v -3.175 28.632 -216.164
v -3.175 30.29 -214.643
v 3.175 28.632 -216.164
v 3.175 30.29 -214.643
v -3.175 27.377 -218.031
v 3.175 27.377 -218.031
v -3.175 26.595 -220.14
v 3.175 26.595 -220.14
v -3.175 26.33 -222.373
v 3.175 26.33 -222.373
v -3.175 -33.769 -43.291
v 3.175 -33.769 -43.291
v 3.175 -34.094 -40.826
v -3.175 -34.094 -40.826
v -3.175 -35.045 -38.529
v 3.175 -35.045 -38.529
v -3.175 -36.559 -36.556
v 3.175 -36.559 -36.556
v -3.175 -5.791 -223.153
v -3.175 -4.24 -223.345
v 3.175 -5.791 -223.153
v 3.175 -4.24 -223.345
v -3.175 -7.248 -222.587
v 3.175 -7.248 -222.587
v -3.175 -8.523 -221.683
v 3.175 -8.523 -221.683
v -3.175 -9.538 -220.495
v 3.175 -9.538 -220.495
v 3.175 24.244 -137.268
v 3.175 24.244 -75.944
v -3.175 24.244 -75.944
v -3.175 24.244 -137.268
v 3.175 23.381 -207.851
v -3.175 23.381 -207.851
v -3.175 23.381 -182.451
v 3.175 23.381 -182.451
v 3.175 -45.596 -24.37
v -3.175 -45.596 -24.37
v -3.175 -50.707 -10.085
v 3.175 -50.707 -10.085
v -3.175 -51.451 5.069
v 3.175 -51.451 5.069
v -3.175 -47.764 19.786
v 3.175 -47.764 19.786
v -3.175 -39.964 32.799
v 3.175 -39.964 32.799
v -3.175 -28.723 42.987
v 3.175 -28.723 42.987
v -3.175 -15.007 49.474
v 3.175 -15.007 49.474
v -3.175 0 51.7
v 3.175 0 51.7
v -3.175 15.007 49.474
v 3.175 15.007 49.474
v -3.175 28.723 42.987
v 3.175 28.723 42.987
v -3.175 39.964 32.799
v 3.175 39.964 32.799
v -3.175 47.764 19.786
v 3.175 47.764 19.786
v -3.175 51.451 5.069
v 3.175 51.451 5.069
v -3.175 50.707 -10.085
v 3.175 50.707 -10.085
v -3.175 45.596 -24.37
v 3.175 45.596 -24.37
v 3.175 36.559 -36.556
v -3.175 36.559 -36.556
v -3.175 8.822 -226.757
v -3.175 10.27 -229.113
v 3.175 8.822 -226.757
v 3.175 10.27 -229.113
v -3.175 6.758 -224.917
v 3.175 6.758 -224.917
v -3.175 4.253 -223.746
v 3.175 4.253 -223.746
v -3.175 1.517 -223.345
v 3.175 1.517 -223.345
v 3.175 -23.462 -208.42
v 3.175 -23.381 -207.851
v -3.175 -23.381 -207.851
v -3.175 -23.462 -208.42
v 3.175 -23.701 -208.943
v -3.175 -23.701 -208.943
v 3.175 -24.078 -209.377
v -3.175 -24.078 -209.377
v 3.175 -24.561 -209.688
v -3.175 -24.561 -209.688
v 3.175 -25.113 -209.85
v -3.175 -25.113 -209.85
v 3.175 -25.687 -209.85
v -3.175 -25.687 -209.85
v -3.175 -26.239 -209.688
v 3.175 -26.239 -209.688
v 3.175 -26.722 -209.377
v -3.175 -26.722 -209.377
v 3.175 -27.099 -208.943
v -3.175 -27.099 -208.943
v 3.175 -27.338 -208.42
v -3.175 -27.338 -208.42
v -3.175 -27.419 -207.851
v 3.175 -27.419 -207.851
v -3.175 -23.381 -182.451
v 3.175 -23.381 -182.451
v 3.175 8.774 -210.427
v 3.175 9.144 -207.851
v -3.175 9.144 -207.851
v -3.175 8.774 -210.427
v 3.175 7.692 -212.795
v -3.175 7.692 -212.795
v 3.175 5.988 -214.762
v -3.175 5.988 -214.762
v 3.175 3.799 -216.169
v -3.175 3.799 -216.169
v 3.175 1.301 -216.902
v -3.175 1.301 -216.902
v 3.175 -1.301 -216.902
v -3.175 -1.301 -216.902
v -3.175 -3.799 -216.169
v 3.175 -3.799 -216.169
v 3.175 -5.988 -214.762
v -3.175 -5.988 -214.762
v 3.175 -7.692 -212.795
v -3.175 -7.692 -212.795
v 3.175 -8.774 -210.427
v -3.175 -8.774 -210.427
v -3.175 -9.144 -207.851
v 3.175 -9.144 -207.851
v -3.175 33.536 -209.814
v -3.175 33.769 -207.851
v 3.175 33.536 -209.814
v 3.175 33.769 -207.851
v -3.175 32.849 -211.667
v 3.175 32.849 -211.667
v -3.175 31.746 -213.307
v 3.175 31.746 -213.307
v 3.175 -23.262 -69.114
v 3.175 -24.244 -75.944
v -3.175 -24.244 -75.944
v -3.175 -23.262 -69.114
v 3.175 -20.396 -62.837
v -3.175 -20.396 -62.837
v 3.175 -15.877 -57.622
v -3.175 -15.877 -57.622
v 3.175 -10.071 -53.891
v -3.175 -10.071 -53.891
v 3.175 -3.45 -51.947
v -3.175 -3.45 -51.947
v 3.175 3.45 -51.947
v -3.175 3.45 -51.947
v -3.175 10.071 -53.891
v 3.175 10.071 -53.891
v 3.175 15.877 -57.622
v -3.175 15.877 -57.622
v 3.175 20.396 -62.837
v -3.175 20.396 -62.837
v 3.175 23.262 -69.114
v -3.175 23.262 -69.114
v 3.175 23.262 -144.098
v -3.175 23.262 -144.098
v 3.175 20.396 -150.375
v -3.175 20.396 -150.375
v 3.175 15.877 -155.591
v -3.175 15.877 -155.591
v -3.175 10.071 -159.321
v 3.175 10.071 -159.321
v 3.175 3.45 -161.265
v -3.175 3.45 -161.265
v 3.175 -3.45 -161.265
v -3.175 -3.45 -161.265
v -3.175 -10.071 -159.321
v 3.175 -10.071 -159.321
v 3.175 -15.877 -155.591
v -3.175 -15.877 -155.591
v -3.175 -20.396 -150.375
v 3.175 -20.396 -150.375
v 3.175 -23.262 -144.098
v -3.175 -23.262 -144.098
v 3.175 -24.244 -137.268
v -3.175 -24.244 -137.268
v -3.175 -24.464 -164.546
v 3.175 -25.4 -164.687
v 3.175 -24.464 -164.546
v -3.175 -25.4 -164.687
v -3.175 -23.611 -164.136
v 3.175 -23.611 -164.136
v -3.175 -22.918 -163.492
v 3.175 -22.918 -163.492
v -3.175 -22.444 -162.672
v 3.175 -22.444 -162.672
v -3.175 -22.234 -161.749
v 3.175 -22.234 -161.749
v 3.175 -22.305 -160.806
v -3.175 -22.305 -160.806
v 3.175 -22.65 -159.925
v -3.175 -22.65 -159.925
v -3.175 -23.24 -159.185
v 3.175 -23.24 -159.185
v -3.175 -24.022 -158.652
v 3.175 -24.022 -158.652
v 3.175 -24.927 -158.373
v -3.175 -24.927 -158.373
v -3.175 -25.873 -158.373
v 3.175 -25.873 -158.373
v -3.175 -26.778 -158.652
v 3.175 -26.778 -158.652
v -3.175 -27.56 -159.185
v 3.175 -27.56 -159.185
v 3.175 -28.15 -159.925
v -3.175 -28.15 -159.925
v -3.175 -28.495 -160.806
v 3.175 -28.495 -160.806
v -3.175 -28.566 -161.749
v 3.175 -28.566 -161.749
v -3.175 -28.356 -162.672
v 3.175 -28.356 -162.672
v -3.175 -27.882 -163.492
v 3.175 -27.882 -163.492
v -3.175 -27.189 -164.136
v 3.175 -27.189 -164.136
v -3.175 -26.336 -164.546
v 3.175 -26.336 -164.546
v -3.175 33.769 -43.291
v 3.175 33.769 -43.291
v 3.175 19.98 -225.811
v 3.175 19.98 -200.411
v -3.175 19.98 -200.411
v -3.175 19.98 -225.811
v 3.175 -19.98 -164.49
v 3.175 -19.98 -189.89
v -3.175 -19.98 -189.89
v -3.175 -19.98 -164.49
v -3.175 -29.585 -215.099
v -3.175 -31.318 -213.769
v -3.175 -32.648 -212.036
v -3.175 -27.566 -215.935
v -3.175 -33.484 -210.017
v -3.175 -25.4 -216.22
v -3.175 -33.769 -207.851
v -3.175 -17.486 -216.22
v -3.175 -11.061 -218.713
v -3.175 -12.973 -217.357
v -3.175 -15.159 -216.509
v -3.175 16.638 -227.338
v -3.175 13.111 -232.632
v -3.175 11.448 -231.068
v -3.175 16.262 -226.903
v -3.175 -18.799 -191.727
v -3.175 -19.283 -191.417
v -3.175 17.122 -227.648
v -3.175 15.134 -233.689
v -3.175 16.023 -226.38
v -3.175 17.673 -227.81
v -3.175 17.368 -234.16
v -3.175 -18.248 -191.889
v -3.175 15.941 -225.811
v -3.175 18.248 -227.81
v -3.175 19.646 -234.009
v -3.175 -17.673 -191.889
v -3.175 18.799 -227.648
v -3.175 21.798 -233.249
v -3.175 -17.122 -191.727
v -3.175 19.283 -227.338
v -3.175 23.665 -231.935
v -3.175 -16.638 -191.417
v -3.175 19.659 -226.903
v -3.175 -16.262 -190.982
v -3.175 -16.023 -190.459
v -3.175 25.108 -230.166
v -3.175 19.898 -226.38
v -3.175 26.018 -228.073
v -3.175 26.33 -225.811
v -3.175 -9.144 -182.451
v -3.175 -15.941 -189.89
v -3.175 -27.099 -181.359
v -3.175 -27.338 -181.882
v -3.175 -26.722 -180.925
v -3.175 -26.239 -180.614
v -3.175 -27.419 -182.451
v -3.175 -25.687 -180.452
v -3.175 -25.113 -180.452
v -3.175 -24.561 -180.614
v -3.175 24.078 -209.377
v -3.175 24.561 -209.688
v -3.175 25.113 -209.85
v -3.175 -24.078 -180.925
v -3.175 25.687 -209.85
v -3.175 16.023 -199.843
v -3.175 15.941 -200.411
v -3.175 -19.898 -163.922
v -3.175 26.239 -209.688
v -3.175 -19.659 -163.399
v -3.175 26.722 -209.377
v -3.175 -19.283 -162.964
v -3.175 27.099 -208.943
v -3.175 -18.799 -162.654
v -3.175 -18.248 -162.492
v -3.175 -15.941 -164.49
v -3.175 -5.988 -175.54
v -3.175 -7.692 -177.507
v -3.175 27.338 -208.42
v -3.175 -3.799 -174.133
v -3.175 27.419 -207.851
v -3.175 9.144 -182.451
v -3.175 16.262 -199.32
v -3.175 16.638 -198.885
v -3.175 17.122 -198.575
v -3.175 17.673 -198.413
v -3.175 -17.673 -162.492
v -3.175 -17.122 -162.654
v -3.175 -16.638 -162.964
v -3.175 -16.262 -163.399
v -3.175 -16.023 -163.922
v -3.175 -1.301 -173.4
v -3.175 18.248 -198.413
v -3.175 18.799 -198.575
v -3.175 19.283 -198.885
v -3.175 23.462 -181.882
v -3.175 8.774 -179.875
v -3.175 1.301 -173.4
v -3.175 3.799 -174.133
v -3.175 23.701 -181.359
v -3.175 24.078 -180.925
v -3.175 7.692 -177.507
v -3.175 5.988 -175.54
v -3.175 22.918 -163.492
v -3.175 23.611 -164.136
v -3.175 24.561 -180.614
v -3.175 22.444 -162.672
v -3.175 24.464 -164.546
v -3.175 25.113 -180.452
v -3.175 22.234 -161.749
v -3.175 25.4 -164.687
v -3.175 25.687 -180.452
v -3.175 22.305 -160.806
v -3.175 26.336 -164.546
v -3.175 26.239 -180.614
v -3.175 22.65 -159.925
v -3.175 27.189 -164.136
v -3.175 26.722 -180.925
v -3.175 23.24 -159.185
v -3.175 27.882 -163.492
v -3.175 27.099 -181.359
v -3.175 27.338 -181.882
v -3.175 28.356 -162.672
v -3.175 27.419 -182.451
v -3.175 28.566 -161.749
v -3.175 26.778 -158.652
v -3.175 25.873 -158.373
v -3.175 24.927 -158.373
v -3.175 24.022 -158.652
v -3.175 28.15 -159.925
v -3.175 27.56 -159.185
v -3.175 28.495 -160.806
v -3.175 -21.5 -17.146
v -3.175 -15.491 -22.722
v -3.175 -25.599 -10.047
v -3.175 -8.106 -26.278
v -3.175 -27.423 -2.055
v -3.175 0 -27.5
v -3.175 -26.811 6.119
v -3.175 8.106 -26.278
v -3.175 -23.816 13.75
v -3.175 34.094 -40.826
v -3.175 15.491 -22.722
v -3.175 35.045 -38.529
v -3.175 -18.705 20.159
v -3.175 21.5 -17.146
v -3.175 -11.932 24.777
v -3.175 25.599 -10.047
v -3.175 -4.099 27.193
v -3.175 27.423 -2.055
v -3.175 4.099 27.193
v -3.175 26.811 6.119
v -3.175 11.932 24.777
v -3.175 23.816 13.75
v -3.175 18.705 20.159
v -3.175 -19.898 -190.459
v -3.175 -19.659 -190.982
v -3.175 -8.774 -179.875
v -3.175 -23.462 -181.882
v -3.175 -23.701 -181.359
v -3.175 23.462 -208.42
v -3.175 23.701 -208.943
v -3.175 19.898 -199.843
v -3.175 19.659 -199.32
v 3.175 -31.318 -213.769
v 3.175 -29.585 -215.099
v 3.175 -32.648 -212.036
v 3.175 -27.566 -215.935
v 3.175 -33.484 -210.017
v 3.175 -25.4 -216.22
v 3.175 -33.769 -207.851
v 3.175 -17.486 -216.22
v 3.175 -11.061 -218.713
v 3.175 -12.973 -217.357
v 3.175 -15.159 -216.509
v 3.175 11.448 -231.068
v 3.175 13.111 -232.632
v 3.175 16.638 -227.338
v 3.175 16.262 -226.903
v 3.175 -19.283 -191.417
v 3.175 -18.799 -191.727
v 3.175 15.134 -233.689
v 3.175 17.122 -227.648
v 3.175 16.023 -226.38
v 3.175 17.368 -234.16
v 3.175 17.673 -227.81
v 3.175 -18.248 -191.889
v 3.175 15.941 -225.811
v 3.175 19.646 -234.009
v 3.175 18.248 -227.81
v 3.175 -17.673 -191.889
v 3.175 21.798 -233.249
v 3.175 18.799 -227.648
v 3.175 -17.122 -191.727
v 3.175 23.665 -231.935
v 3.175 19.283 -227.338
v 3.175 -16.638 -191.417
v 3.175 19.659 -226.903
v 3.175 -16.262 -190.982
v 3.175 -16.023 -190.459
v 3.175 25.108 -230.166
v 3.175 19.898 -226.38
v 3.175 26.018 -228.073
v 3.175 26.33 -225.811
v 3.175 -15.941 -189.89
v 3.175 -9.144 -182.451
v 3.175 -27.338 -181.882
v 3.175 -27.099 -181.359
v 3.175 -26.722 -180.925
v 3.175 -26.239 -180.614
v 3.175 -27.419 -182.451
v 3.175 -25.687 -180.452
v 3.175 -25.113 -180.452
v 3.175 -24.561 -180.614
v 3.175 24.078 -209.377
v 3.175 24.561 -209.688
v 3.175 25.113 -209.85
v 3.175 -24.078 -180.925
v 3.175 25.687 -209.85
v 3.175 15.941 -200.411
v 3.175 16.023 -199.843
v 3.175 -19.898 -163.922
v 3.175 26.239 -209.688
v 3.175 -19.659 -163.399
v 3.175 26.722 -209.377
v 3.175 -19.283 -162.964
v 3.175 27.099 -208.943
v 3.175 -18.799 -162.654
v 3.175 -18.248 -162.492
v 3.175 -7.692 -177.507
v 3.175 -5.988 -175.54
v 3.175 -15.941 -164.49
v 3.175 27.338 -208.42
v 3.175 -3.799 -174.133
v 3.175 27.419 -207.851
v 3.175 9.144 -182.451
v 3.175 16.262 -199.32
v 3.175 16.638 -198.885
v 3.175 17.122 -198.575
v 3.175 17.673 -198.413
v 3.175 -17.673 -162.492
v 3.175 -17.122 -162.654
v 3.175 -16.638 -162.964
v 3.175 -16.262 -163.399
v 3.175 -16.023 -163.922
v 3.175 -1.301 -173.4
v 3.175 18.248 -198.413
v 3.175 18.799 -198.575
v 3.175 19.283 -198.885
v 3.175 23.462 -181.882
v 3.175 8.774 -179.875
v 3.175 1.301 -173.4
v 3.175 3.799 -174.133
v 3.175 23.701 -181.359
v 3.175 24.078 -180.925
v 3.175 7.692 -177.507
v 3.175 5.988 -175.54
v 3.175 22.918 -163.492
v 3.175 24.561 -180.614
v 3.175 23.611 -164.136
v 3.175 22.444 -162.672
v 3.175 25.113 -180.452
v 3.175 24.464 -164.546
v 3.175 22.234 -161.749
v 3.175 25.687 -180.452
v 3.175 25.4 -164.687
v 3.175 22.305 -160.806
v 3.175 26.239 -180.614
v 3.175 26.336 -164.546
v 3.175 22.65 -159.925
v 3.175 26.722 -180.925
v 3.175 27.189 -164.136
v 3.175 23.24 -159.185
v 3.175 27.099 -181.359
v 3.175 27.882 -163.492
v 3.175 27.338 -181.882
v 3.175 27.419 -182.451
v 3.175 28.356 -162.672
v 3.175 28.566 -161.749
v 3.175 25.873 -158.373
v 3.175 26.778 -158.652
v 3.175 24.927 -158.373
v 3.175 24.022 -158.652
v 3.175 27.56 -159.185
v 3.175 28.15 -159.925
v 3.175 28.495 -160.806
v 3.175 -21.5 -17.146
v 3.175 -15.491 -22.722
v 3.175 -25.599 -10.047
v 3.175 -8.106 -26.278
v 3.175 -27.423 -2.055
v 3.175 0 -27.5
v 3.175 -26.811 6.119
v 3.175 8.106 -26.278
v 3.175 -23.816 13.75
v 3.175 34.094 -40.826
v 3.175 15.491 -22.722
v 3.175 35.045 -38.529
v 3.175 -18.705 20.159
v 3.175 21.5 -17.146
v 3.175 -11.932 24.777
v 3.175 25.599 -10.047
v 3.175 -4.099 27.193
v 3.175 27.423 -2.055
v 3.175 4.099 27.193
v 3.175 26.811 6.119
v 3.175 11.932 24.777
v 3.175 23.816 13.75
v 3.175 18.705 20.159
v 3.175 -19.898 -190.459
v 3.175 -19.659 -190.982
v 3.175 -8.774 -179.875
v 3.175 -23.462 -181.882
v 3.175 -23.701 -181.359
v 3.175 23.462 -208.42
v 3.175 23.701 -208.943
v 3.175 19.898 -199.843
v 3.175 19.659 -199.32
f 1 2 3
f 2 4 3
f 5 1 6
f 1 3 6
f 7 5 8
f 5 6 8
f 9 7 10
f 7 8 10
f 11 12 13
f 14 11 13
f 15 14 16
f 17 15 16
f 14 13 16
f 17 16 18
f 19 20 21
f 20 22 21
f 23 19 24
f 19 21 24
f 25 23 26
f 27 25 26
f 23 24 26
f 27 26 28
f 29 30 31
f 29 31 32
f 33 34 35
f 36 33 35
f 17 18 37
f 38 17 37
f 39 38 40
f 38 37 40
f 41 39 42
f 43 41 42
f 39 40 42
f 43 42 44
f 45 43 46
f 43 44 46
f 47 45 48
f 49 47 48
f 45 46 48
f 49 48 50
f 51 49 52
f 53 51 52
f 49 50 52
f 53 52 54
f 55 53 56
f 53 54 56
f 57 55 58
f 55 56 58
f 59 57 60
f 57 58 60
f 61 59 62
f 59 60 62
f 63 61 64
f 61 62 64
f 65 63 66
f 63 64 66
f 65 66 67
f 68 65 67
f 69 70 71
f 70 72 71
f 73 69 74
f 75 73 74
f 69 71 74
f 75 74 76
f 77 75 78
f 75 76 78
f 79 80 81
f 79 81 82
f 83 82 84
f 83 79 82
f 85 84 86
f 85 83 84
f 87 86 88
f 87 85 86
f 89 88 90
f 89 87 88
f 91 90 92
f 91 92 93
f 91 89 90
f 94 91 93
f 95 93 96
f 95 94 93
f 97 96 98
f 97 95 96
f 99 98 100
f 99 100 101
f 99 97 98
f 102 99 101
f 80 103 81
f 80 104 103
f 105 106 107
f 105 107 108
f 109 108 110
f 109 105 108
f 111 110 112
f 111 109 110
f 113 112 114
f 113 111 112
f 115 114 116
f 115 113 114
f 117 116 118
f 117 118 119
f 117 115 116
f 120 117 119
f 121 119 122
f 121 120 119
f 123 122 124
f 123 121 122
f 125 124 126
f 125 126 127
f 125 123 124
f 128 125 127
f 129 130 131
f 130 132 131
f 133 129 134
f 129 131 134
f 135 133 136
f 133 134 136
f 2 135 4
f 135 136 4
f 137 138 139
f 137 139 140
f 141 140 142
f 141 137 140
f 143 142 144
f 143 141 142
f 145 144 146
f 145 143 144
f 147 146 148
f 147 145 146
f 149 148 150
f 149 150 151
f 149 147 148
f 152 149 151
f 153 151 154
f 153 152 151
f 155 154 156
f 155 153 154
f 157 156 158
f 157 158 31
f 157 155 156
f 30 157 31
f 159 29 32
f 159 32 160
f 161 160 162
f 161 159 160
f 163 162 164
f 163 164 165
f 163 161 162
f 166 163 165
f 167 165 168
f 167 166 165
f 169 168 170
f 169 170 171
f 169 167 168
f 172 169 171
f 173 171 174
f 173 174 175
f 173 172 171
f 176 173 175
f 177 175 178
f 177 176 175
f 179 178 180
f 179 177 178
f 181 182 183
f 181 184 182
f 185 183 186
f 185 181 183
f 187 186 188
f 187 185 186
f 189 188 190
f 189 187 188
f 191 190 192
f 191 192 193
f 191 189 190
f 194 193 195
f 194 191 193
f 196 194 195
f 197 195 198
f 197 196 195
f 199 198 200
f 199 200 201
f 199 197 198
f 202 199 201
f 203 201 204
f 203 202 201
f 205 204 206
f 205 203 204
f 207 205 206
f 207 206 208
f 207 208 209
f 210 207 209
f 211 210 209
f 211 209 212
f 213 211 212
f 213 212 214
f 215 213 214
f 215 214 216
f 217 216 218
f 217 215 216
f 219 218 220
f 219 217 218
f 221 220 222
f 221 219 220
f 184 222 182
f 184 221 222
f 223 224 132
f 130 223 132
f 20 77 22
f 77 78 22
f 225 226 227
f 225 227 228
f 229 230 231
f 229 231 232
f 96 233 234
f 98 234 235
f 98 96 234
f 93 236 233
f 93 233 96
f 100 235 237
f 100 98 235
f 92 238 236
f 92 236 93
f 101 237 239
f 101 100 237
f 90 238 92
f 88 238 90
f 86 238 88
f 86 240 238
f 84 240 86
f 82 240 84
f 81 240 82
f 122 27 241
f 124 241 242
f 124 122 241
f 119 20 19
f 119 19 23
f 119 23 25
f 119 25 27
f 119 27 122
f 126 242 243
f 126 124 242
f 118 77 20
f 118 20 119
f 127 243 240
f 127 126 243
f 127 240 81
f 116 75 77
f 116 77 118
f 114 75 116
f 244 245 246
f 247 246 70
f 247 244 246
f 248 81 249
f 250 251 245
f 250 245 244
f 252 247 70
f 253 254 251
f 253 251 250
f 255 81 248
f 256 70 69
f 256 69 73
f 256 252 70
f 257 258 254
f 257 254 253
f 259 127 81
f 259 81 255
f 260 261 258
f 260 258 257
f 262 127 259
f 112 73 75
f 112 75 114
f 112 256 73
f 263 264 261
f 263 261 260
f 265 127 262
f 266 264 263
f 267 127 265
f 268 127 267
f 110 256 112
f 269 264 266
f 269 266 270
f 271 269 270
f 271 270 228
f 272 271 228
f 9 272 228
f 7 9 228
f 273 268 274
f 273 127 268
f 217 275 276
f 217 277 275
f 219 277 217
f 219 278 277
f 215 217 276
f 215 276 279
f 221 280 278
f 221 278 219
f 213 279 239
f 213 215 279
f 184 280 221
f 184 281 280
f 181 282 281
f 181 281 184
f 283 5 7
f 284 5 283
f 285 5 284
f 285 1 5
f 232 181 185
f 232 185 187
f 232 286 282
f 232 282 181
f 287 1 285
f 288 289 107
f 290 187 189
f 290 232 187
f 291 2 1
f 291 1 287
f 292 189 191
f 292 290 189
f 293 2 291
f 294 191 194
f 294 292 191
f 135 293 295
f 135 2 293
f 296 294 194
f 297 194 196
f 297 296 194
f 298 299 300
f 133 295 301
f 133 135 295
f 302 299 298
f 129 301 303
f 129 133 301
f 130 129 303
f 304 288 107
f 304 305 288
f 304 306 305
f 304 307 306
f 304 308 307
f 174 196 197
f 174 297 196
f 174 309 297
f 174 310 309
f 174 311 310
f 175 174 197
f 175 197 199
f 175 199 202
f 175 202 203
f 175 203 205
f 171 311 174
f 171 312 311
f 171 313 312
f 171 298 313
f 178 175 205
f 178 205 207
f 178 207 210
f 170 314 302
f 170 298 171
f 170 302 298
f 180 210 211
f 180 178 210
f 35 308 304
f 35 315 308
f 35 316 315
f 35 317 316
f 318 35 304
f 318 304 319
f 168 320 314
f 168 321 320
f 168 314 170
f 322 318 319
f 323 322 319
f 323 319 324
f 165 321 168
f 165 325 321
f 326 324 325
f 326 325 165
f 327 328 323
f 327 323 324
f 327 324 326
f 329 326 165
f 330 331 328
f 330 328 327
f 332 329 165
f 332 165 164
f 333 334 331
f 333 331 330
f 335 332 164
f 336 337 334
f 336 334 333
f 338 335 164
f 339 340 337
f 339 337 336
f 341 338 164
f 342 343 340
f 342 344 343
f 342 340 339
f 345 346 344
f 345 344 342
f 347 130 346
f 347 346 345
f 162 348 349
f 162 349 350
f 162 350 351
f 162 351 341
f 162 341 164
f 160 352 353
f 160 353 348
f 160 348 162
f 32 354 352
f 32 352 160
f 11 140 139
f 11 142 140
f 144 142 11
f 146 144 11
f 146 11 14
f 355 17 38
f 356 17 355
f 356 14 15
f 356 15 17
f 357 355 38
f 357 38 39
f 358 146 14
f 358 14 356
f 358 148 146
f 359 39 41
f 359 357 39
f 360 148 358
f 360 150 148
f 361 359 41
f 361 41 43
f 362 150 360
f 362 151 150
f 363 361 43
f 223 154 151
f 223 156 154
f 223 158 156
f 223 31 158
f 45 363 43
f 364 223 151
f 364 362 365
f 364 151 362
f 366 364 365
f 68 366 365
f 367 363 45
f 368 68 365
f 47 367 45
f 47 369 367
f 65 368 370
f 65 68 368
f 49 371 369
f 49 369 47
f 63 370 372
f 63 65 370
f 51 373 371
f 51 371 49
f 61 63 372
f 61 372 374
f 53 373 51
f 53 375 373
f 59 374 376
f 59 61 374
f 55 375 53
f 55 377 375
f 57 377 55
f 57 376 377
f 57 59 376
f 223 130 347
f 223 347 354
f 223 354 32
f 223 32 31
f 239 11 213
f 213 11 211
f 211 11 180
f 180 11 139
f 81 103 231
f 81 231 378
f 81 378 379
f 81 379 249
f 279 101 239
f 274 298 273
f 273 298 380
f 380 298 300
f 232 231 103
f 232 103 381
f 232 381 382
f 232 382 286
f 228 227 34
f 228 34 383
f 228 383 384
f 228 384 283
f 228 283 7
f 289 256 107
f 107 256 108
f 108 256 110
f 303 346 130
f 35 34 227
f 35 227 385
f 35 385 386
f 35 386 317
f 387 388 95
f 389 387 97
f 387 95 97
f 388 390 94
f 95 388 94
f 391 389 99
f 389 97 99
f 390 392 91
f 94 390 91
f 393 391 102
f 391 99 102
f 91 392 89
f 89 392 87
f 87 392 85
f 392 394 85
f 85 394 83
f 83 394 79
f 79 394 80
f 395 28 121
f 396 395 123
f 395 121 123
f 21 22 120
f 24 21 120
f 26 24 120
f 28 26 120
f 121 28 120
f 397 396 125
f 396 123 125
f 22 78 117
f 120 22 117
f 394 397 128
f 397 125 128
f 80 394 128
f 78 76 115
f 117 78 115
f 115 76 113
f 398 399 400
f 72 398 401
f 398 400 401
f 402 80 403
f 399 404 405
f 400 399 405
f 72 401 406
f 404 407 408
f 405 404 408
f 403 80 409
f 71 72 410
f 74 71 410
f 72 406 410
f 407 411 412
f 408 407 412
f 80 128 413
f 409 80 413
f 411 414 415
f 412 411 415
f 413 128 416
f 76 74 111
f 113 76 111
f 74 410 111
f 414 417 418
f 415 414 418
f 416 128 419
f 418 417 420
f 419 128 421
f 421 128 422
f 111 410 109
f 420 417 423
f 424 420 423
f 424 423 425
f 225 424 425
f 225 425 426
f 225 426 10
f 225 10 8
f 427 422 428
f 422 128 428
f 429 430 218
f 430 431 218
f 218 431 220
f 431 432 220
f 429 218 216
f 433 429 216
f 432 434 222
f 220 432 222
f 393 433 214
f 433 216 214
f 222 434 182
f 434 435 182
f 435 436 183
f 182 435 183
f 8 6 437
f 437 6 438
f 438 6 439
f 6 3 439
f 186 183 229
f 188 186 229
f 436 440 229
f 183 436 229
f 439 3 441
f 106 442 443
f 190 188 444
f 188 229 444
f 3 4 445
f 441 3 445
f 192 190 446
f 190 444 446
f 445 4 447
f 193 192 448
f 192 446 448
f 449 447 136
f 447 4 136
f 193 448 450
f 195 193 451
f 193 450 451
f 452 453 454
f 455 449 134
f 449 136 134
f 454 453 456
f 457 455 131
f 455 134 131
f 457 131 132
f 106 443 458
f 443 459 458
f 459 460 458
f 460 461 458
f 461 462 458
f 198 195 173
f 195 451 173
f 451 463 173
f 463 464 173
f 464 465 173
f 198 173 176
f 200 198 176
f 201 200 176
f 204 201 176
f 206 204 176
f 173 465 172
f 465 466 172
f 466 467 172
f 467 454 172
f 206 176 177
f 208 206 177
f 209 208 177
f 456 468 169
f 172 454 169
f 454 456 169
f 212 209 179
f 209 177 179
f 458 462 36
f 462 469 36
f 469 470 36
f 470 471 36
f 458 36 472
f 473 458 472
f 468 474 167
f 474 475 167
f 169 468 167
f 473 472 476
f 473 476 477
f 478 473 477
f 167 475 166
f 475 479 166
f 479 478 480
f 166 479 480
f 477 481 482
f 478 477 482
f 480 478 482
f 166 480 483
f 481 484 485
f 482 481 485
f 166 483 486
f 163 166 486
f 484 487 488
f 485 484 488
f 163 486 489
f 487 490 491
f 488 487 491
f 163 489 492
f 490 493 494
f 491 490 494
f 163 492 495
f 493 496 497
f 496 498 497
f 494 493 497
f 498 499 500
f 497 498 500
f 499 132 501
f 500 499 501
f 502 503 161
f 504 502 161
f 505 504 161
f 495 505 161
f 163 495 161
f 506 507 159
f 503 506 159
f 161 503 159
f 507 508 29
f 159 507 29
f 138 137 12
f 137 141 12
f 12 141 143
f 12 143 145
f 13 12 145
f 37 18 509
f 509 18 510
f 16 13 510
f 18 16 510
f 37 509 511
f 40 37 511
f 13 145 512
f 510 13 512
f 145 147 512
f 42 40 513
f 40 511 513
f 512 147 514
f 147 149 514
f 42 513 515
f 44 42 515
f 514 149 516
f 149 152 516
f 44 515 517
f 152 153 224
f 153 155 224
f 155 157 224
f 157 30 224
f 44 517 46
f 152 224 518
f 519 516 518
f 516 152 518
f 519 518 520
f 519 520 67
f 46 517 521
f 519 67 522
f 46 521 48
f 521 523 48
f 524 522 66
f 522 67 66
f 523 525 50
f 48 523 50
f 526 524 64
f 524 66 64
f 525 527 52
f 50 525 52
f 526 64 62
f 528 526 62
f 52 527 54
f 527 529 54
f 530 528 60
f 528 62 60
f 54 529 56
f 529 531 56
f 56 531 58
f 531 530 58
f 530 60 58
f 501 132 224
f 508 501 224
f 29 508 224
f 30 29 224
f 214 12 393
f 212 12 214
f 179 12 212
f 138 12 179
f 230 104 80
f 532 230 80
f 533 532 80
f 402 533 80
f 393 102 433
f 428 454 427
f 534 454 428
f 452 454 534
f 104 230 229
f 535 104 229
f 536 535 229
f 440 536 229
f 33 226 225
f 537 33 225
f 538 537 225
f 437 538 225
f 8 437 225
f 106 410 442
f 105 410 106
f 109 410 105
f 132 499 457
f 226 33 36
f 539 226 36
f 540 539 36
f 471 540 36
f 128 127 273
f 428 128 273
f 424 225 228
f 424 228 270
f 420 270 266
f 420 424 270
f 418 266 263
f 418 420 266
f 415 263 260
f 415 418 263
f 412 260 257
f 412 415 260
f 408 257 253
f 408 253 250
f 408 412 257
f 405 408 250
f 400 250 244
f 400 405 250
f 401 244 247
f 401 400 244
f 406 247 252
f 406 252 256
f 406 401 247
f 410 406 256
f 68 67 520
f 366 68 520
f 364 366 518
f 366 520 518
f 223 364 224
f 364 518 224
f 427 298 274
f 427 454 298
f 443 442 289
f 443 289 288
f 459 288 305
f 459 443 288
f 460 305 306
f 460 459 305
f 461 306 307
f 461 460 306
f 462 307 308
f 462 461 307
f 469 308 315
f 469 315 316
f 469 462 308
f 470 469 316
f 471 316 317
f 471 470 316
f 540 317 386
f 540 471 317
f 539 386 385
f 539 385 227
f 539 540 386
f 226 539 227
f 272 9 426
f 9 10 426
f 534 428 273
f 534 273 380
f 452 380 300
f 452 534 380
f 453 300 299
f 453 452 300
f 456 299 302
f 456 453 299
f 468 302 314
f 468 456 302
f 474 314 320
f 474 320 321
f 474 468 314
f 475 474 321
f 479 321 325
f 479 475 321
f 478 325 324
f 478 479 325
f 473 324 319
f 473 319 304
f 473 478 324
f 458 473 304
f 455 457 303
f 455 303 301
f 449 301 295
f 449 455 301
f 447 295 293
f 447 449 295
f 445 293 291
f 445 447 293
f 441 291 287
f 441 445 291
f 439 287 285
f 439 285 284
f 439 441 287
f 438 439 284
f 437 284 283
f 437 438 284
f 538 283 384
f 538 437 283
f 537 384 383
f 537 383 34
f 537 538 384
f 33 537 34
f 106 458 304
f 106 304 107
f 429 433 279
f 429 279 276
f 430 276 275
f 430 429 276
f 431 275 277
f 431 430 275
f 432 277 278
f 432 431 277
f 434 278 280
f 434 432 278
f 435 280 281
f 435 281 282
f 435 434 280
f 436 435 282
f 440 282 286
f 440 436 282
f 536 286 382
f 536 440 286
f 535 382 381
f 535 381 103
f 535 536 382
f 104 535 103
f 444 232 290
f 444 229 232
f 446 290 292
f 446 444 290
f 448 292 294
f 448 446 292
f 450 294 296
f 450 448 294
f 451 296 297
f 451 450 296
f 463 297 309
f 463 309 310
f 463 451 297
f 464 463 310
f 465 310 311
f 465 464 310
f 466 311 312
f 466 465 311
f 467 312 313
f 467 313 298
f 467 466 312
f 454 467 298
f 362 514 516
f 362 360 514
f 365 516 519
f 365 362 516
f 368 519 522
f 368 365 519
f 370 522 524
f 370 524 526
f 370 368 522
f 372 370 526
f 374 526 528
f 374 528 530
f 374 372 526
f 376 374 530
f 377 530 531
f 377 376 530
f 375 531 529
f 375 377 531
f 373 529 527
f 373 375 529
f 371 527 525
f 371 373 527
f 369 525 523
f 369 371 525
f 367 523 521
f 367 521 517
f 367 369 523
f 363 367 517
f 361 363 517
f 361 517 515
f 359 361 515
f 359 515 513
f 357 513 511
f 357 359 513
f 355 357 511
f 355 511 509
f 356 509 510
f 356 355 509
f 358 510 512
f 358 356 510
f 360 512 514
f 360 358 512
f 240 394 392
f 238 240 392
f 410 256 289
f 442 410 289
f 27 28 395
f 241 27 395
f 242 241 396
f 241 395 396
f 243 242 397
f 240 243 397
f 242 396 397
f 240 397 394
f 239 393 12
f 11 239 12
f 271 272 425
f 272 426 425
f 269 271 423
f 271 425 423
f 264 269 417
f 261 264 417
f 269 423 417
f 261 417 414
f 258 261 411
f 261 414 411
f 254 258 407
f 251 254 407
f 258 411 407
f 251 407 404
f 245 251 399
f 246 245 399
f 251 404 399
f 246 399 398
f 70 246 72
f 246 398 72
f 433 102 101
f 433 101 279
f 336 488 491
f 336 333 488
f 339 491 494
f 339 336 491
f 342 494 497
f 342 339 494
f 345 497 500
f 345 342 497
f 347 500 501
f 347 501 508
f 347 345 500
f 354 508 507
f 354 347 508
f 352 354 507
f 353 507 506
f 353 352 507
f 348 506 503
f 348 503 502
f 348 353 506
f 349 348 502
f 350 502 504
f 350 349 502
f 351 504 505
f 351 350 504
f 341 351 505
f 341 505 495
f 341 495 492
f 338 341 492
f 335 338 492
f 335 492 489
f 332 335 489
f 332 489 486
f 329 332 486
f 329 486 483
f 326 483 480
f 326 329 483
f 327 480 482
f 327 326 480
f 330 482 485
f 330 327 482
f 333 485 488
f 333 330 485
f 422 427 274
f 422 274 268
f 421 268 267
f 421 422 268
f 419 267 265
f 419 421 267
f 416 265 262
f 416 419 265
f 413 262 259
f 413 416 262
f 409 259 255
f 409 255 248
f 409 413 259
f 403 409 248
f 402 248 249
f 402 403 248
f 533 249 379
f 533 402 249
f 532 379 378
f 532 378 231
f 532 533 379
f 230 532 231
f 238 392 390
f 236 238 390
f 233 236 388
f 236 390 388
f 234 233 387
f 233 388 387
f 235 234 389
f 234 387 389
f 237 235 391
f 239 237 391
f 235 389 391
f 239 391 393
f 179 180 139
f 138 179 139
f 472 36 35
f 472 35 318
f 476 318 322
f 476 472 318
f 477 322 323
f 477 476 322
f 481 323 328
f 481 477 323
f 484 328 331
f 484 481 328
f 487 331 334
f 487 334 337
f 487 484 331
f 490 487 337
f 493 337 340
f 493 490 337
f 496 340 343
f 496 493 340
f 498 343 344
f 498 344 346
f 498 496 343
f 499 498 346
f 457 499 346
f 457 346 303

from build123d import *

# Parameters (mm, degrees)
SKETCH1_R           = 27.5
SKETCH1_R_2         = 3.175
BOSS_EXTRUDE1_DEPTH = 3.175


with BuildPart() as part:
    # Sketch1 → Boss-Extrude1 (new, symmetric)
    with BuildSketch(Plane(origin=(0, 0, 0), x_dir=(0, 0, -1), z_dir=(1, 0, 0))):
        with BuildLine():
            Line((43.290925291, 33.7693), (207.850950123, 33.7693))
            ThreePointArc((207.850950123, 33.7693), (211.66677379, 32.848803409), (214.643231519, 30.28979508))
            ThreePointArc((214.643231519, 30.28979508), (218.030702378, 27.377418378), (222.373445551, 26.329812242))
            Line((222.373445551, 26.329812242), (225.811462365, 26.329812242))
            ThreePointArc((225.811462365, 26.329812242), (234.009351835, 19.645680106), (229.112770692, 10.26983309))
            ThreePointArc((229.112770692, 10.26983309), (224.916562194, 6.758274432), (223.344950123, 1.517163342))
            Line((223.344950123, 1.517163342), (223.344950123, -4.239874171))
            ThreePointArc((223.344950123, -4.239874171), (222.587277992, -7.247924869), (220.495070123, -9.538143699))
            ThreePointArc((220.495070123, -9.538143699), (217.356758318, -12.973471943), (216.220250123, -17.48554799))
            Line((216.220250123, -17.48554799), (216.220250123, -25.4))
            ThreePointArc((216.220250123, -25.4), (213.768938906, -31.317988784), (207.850950123, -33.7693))
            Line((207.850950123, -33.7693), (43.290925291, -33.7693))
            ThreePointArc((43.290925291, -33.7693), (39.64603709, -34.49427642), (36.555995713, -36.558845406))
            ThreePointArc((36.555995713, -36.558845406), (-51.7, 0), (36.555995713, 36.558845406))
            ThreePointArc((36.555995713, 36.558845406), (39.64603709, 34.49427642), (43.290925291, 33.7693))
        make_face()
        Circle(SKETCH1_R, mode=Mode.SUBTRACT)
        with Locations((161.512193823, 25.4)):
            Circle(SKETCH1_R_2, mode=Mode.SUBTRACT)
        with Locations((161.512193823, -25.4)):
            Circle(SKETCH1_R_2, mode=Mode.SUBTRACT)
        with BuildLine():
            Line((75.9443, 24.2443), (137.267893823, 24.2443))
            ThreePointArc((137.267893823, 24.2443), (161.512193823, 0), (137.267893823, -24.2443))
            Line((137.267893823, -24.2443), (75.9443, -24.2443))
            ThreePointArc((75.9443, -24.2443), (51.7, 0), (75.9443, 24.2443))
        make_face(mode=Mode.SUBTRACT)
        with BuildLine():
            Line((182.450950123, 9.144), (207.850950123, 9.144))
            ThreePointArc((207.850950123, 9.144), (216.994950123, 0), (207.850950123, -9.144))
            Line((207.850950123, -9.144), (182.450950123, -9.144))
            ThreePointArc((182.450950123, -9.144), (173.306950123, 0), (182.450950123, 9.144))
        make_face(mode=Mode.SUBTRACT)
        with BuildLine():
            Line((164.490437881, -15.941212242), (189.890437881, -15.941212242))
            ThreePointArc((189.890437881, -15.941212242), (191.909737881, -17.960512242), (189.890437881, -19.979812242))
            Line((189.890437881, -19.979812242), (164.490437881, -19.979812242))
            ThreePointArc((164.490437881, -19.979812242), (162.471137881, -17.960512242), (164.490437881, -15.941212242))
        make_face(mode=Mode.SUBTRACT)
        with BuildLine():
            Line((200.411462365, 19.979812242), (225.811462365, 19.979812242))
            ThreePointArc((225.811462365, 19.979812242), (227.830762365, 17.960512242), (225.811462365, 15.941212242))
            Line((225.811462365, 15.941212242), (200.411462365, 15.941212242))
            ThreePointArc((200.411462365, 15.941212242), (198.392162365, 17.960512242), (200.411462365, 19.979812242))
        make_face(mode=Mode.SUBTRACT)
        with BuildLine():
            Line((182.450950123, 27.4193), (207.850950123, 27.4193))
            ThreePointArc((207.850950123, 27.4193), (209.870250123, 25.4), (207.850950123, 23.3807))
            Line((207.850950123, 23.3807), (182.450950123, 23.3807))
            ThreePointArc((182.450950123, 23.3807), (180.431650123, 25.4), (182.450950123, 27.4193))
        make_face(mode=Mode.SUBTRACT)
        with BuildLine():
            Line((182.450950123, -23.3807), (207.850950123, -23.3807))
            ThreePointArc((207.850950123, -23.3807), (209.870250123, -25.4), (207.850950123, -27.4193))
            Line((207.850950123, -27.4193), (182.450950123, -27.4193))
            ThreePointArc((182.450950123, -27.4193), (180.431650123, -25.4), (182.450950123, -23.3807))
        make_face(mode=Mode.SUBTRACT)
    extrude(amount=BOSS_EXTRUDE1_DEPTH, both=True)


solid = part.part
